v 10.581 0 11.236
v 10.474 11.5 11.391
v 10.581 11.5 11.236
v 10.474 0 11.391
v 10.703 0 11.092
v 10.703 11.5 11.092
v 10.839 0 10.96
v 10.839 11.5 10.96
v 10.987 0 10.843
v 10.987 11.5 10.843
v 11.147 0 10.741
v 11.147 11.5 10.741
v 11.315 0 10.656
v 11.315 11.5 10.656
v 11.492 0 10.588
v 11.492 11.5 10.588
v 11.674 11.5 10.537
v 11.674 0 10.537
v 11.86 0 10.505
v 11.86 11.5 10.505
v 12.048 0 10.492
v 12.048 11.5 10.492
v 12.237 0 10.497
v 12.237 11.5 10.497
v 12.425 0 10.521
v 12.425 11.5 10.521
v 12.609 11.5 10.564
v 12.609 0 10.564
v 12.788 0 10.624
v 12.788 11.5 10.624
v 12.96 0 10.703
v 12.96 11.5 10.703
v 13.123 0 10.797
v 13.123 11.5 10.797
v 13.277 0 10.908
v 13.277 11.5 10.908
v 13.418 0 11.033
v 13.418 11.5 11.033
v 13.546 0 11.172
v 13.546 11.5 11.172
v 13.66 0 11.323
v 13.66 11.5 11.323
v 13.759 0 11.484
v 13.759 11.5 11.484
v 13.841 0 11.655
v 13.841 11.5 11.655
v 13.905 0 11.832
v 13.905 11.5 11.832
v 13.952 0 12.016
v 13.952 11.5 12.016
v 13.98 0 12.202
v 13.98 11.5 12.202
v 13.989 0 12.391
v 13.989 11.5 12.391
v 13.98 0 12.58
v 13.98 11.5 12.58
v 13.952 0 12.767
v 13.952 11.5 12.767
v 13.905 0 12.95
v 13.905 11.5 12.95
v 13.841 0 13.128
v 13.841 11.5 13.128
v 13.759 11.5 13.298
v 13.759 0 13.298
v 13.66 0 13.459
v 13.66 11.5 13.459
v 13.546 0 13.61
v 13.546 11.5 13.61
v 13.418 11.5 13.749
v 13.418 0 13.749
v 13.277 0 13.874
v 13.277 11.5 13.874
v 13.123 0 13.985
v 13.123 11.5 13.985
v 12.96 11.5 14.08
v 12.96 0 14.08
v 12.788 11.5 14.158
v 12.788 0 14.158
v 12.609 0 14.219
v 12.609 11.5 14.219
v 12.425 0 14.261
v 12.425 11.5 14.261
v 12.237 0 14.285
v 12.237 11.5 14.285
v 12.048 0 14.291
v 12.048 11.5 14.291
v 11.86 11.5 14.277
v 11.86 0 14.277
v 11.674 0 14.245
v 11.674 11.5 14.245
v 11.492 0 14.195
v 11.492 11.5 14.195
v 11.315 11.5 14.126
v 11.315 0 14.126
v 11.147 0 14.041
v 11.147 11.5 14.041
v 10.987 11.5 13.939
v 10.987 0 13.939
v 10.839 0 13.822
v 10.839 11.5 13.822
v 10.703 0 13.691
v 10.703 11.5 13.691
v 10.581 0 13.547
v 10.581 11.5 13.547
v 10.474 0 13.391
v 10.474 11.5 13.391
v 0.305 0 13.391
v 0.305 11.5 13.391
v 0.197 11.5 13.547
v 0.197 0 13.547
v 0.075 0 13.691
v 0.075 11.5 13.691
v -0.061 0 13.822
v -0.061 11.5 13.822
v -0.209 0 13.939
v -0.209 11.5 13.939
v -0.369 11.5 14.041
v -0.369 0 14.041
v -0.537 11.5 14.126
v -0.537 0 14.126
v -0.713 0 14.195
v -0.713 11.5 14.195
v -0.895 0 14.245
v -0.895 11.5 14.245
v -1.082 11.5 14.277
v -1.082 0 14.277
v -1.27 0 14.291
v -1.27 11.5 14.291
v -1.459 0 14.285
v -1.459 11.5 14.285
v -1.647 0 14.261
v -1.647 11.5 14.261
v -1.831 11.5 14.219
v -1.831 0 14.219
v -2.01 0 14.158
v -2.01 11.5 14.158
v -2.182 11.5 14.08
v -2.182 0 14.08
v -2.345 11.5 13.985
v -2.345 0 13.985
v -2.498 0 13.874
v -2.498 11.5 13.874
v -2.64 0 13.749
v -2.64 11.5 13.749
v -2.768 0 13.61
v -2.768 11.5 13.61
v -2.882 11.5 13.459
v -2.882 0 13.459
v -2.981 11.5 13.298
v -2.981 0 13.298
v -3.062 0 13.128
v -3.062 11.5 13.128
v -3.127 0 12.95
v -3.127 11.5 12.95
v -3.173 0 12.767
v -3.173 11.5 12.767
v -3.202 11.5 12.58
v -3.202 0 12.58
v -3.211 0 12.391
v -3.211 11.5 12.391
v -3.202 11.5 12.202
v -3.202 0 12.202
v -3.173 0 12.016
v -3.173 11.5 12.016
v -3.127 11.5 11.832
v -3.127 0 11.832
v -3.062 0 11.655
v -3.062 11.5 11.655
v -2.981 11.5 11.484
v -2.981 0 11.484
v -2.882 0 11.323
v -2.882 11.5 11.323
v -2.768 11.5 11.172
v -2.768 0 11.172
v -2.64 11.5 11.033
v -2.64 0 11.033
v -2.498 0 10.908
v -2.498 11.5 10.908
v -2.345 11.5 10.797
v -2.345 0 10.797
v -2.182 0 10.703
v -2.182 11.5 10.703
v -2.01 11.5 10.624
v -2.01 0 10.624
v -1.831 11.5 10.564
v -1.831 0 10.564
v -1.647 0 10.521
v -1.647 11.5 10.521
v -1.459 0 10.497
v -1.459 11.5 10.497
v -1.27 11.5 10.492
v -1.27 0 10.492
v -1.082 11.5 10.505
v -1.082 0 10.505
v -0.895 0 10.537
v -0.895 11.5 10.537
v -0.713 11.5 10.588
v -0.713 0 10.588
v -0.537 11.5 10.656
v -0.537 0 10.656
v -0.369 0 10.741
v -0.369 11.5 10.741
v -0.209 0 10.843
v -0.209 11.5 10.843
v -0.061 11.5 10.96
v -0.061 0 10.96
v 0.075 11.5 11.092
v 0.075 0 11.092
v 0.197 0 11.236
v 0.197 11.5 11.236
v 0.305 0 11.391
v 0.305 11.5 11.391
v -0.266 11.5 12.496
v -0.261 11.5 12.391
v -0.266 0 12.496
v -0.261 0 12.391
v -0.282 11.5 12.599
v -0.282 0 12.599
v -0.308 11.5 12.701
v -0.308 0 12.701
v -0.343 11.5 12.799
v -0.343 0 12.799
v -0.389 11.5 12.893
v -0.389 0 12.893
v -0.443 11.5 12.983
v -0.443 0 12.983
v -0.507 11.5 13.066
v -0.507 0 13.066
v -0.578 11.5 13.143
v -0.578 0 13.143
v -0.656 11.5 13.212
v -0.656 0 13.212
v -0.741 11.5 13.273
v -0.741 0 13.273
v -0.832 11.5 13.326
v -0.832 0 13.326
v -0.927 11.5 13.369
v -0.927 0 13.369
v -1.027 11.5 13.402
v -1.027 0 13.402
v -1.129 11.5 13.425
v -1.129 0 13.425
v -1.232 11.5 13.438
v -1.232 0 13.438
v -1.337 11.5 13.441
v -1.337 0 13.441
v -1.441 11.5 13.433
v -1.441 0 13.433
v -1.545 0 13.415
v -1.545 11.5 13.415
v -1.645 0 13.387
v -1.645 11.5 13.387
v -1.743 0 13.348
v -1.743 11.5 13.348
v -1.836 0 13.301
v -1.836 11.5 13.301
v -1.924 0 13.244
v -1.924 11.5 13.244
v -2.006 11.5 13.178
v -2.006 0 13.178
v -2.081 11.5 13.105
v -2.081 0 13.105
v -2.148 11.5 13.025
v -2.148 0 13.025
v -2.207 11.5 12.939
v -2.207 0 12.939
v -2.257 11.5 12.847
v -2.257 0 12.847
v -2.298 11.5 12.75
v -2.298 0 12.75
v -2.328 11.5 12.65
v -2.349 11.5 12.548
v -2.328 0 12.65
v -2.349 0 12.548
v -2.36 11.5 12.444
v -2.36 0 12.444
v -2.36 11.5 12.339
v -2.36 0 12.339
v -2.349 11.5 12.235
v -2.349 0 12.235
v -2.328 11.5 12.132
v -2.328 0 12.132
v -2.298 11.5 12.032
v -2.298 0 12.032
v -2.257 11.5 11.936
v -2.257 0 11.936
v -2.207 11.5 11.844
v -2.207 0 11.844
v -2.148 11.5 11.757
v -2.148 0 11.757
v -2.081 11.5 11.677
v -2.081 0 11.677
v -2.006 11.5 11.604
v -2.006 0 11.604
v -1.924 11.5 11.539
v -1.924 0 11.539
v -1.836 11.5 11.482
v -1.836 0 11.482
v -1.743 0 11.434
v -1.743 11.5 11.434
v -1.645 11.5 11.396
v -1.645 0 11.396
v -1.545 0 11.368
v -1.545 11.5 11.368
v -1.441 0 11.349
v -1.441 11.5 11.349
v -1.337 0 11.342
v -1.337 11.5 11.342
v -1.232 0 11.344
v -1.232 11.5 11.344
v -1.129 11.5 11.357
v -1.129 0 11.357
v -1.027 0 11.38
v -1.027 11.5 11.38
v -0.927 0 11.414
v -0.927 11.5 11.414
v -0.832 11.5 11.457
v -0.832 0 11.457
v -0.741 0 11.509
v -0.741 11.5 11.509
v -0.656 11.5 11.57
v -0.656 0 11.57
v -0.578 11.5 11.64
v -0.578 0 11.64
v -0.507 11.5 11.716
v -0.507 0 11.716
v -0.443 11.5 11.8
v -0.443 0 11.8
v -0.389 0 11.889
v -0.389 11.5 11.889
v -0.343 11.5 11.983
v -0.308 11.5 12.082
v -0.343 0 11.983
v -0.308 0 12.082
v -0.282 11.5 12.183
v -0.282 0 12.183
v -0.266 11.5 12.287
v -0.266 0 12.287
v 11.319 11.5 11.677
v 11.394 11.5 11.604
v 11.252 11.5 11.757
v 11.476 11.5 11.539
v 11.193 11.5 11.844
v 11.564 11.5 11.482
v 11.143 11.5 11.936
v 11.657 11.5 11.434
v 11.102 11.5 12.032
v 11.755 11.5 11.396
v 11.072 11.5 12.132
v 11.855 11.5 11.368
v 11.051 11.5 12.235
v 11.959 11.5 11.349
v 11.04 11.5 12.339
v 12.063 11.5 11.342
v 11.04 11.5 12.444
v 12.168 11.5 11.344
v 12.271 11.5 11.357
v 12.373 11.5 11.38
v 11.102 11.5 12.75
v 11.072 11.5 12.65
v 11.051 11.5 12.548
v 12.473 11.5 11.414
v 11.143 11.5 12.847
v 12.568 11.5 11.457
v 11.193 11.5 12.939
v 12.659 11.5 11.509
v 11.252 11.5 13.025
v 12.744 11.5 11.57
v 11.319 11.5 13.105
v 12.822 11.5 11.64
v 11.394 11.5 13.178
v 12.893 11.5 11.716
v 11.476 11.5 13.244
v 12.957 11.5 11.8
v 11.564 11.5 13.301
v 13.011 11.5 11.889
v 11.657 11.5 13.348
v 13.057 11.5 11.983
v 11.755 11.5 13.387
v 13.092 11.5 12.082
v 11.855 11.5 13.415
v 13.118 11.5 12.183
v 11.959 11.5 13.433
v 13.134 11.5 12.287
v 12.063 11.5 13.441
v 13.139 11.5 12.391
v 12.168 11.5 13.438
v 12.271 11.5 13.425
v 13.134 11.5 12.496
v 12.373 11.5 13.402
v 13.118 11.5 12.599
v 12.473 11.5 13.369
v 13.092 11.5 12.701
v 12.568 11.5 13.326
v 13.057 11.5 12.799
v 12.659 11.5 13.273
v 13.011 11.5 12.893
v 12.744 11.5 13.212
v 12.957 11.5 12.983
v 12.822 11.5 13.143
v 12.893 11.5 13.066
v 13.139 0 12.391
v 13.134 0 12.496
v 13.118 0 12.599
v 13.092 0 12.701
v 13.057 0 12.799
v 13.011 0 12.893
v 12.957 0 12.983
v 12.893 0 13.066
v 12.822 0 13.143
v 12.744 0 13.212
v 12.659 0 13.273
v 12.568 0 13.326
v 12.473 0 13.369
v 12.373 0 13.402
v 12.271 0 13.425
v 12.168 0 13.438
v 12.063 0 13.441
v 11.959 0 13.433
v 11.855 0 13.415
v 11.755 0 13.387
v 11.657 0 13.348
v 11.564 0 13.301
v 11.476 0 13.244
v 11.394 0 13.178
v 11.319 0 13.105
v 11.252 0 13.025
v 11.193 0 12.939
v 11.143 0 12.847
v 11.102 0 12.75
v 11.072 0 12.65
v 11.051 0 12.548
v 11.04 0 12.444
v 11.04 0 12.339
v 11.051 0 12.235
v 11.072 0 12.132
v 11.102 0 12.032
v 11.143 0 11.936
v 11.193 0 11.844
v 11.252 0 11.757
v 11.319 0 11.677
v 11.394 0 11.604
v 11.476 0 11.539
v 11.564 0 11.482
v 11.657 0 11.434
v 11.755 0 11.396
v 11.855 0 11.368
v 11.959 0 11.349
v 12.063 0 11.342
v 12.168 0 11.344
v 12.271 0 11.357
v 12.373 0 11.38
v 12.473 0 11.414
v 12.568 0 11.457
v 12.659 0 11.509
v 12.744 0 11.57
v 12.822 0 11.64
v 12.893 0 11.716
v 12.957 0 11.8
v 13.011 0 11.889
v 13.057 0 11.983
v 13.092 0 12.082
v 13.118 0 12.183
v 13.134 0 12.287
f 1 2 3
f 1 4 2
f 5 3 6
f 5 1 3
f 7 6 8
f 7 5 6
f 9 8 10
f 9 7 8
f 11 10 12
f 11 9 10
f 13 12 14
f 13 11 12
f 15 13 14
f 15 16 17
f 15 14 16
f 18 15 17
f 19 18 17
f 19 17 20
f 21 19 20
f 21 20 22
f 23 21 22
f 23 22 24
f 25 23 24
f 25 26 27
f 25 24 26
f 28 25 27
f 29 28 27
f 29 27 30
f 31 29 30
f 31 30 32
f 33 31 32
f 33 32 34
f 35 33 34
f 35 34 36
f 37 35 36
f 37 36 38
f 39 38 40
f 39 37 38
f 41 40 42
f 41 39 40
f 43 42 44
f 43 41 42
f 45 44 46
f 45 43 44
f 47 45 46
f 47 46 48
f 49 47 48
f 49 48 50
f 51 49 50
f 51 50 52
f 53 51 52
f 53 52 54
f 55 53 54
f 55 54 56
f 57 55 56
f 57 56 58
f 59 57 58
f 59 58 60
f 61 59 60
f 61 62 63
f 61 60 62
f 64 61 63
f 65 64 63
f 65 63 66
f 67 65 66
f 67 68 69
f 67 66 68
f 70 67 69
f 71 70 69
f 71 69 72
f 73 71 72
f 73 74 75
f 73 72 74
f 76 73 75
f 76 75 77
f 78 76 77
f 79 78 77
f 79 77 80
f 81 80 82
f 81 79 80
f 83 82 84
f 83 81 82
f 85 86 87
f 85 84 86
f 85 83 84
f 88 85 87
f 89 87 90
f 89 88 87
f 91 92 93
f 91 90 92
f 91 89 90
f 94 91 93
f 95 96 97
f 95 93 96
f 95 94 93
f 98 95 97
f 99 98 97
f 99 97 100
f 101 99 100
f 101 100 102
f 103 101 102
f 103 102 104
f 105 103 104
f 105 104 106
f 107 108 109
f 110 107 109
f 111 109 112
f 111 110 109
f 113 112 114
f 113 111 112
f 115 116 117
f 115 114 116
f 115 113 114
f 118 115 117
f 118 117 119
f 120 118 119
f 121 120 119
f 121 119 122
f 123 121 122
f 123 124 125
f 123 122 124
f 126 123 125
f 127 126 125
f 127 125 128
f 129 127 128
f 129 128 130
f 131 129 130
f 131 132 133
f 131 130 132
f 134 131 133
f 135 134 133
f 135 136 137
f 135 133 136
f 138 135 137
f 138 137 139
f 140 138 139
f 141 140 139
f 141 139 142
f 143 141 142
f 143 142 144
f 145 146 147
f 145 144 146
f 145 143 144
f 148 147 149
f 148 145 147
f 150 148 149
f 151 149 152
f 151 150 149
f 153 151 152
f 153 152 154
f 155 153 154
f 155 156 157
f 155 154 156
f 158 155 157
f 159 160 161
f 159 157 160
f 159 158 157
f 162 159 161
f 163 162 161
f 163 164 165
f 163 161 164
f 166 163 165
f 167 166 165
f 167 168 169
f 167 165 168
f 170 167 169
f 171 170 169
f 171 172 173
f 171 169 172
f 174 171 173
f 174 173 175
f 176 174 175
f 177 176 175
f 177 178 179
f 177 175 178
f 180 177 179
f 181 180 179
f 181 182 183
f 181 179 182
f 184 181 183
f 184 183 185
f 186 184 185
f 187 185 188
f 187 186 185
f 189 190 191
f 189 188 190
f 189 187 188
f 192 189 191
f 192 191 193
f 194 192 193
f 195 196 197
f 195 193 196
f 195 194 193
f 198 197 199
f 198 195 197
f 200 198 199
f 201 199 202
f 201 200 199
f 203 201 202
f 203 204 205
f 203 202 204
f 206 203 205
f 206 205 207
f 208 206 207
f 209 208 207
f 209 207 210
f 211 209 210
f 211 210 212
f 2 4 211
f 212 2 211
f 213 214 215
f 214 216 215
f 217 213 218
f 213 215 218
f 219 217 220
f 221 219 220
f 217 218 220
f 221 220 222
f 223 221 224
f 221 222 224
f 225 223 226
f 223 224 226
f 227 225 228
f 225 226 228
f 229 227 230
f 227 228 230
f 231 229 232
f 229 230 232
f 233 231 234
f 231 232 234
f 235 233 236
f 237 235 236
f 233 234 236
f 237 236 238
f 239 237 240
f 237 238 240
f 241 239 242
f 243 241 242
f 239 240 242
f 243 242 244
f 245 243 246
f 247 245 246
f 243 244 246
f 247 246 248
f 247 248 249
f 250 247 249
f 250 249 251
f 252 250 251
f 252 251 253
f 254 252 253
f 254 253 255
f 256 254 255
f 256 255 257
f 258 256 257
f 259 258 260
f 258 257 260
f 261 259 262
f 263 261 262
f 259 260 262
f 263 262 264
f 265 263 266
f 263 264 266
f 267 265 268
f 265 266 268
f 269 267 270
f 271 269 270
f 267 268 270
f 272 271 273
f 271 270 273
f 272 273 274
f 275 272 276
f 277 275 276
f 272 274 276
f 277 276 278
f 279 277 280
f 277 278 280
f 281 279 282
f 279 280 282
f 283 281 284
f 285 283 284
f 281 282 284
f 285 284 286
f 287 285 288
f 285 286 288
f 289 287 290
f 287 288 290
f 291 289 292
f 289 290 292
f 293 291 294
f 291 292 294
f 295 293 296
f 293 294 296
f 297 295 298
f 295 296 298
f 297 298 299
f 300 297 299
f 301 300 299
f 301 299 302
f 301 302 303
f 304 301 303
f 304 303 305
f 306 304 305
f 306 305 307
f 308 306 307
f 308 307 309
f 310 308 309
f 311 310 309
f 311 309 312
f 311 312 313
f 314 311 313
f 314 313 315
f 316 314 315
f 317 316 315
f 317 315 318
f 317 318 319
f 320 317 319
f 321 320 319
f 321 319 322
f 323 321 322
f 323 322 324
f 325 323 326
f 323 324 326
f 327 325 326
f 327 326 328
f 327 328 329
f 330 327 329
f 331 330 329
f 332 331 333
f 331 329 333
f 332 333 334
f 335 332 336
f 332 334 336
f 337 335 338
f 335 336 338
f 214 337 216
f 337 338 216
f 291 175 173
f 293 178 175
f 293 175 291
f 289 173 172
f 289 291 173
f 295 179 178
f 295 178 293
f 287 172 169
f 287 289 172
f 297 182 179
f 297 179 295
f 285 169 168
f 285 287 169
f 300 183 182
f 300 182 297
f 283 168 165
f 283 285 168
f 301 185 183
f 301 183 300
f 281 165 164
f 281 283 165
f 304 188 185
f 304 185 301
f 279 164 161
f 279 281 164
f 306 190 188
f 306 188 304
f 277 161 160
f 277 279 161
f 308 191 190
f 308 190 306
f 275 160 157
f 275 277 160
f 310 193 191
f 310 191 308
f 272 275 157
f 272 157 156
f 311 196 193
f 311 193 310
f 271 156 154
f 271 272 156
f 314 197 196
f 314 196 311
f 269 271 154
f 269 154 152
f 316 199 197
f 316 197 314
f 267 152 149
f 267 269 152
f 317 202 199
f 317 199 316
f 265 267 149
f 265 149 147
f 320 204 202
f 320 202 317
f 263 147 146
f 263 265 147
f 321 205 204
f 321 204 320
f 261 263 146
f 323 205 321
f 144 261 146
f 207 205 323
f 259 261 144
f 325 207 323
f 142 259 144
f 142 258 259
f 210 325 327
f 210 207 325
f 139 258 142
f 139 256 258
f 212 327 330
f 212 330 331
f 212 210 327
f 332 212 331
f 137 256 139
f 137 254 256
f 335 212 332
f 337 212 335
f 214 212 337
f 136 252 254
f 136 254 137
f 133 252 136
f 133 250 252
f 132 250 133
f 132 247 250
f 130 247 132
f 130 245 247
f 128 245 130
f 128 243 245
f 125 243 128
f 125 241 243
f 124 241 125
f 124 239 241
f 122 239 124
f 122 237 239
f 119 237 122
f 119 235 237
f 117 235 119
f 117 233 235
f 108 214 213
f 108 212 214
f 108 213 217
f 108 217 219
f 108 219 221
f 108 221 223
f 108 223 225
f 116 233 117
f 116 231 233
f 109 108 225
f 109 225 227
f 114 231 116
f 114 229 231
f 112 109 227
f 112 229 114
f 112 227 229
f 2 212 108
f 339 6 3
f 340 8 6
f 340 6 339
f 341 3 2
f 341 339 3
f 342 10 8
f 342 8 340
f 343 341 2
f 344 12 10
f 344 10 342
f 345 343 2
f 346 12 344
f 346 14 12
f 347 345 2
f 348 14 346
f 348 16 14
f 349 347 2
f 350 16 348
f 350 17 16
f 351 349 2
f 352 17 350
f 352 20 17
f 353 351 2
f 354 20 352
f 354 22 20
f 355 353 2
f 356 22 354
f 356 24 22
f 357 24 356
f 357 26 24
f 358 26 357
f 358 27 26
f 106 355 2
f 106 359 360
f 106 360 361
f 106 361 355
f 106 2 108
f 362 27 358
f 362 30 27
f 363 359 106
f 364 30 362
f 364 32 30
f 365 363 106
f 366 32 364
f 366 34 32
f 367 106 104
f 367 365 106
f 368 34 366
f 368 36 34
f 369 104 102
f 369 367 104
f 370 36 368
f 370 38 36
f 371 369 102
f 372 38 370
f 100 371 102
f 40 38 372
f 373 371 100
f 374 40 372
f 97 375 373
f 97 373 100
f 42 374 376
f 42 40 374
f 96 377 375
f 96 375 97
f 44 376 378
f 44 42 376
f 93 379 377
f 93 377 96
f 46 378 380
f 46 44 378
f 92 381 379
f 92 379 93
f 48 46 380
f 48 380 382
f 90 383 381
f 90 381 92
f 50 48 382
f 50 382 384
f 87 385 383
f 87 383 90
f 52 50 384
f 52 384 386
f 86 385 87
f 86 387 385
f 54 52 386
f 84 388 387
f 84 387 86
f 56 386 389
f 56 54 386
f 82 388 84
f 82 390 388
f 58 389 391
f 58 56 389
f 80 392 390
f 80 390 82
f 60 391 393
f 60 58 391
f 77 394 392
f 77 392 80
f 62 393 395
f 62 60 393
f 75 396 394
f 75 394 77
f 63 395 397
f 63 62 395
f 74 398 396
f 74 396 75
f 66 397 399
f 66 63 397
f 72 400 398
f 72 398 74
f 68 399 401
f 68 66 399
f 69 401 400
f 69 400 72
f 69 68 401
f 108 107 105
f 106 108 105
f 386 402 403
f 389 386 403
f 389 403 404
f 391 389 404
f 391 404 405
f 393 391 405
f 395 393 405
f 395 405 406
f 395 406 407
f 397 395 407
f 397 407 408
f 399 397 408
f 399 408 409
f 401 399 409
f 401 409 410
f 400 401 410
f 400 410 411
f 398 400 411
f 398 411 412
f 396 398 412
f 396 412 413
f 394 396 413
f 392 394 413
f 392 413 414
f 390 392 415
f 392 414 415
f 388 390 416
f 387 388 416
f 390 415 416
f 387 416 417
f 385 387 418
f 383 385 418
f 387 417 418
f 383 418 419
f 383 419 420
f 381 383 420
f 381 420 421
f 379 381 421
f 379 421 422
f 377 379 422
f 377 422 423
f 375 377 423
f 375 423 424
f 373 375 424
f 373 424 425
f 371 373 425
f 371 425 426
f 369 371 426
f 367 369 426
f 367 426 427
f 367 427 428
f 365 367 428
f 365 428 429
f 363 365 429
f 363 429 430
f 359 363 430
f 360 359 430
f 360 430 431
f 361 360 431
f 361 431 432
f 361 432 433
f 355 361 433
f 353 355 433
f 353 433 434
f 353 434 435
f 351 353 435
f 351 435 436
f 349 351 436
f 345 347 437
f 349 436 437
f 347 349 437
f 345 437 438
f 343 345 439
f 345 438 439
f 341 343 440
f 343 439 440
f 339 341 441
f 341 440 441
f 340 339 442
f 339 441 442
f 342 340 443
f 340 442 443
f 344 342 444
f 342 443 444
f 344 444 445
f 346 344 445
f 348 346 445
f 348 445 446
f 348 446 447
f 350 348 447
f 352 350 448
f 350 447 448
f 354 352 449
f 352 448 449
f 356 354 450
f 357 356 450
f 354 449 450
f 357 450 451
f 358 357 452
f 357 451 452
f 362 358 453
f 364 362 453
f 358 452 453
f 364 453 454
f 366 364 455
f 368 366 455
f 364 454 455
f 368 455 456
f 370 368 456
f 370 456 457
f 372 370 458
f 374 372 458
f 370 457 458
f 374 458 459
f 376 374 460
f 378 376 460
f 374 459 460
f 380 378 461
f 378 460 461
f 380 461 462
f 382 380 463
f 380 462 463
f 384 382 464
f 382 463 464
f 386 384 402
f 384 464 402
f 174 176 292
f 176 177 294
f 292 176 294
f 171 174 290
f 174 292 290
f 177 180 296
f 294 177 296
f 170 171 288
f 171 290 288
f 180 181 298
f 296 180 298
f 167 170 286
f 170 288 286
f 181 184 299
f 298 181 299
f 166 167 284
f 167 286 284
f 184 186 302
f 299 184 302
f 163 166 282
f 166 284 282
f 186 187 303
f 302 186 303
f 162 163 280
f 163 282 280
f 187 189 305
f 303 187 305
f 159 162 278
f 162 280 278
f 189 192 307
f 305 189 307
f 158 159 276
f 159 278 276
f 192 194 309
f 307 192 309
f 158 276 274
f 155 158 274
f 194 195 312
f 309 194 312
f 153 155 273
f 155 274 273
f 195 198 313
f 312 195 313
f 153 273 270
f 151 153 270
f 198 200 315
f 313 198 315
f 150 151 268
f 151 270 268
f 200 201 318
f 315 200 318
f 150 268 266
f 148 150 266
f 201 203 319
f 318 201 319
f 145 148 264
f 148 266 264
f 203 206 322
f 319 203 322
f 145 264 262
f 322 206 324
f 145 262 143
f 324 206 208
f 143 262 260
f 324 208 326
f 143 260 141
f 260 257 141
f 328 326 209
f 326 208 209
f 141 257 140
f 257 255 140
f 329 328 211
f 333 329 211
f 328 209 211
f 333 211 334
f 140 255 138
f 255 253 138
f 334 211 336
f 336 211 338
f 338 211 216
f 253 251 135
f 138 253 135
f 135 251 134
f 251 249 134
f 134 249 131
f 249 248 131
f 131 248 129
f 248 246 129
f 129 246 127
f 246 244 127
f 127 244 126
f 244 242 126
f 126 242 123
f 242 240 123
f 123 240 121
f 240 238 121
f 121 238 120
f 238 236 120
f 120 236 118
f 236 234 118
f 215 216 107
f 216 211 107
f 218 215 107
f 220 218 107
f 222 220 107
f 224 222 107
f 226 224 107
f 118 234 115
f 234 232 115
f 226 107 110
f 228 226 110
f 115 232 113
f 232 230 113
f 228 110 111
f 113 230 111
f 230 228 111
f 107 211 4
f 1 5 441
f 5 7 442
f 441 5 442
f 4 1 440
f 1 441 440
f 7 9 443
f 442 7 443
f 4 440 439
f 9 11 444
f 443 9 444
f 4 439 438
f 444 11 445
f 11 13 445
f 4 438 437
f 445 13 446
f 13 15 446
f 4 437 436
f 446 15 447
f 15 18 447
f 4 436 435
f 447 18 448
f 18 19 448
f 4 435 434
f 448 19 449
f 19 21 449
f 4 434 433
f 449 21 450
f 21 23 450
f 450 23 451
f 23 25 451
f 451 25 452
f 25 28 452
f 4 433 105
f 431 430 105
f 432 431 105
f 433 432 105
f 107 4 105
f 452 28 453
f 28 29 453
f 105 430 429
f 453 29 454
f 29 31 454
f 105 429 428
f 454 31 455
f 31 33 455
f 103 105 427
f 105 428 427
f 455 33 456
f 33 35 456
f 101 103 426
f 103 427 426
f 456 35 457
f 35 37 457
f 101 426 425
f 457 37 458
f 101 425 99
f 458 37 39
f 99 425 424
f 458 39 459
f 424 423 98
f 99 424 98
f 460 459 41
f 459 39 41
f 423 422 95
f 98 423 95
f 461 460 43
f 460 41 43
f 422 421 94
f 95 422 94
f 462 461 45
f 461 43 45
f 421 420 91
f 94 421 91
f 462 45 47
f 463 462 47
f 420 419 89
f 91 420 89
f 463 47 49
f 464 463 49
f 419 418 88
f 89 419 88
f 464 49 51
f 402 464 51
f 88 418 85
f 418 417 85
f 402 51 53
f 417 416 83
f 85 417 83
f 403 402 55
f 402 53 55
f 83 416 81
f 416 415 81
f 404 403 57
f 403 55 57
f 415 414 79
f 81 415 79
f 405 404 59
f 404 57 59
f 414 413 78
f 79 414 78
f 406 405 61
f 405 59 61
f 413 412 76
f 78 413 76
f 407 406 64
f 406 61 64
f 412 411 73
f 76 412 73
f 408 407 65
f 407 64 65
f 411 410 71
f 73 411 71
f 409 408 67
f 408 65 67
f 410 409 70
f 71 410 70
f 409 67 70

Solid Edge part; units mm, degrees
sketch "Sketch1" plane through (0, 0, 0) normal (0, -1, 0) x (1, 0, 0)
  circle A0 centre (-1.3109, 12.3912) radius 1.05
  circle A1 centre (12.0891, 12.3912) radius 1.05
  line L0 (0.3046, 13.3912) -> (10.4735, 13.3912)
  line L1 (10.4735, 11.3912) -> (0.3046, 11.3912)
  arc A2 (0.3046, 11.3912) -> (0.3046, 13.3912) centre (-1.3109, 12.3912) cw
  arc A3 (10.4735, 13.3912) -> (10.4735, 11.3912) centre (12.0891, 12.3912) cw
extrude "Protrusion1" add sketch "Sketch1" against normal blind 11.5
